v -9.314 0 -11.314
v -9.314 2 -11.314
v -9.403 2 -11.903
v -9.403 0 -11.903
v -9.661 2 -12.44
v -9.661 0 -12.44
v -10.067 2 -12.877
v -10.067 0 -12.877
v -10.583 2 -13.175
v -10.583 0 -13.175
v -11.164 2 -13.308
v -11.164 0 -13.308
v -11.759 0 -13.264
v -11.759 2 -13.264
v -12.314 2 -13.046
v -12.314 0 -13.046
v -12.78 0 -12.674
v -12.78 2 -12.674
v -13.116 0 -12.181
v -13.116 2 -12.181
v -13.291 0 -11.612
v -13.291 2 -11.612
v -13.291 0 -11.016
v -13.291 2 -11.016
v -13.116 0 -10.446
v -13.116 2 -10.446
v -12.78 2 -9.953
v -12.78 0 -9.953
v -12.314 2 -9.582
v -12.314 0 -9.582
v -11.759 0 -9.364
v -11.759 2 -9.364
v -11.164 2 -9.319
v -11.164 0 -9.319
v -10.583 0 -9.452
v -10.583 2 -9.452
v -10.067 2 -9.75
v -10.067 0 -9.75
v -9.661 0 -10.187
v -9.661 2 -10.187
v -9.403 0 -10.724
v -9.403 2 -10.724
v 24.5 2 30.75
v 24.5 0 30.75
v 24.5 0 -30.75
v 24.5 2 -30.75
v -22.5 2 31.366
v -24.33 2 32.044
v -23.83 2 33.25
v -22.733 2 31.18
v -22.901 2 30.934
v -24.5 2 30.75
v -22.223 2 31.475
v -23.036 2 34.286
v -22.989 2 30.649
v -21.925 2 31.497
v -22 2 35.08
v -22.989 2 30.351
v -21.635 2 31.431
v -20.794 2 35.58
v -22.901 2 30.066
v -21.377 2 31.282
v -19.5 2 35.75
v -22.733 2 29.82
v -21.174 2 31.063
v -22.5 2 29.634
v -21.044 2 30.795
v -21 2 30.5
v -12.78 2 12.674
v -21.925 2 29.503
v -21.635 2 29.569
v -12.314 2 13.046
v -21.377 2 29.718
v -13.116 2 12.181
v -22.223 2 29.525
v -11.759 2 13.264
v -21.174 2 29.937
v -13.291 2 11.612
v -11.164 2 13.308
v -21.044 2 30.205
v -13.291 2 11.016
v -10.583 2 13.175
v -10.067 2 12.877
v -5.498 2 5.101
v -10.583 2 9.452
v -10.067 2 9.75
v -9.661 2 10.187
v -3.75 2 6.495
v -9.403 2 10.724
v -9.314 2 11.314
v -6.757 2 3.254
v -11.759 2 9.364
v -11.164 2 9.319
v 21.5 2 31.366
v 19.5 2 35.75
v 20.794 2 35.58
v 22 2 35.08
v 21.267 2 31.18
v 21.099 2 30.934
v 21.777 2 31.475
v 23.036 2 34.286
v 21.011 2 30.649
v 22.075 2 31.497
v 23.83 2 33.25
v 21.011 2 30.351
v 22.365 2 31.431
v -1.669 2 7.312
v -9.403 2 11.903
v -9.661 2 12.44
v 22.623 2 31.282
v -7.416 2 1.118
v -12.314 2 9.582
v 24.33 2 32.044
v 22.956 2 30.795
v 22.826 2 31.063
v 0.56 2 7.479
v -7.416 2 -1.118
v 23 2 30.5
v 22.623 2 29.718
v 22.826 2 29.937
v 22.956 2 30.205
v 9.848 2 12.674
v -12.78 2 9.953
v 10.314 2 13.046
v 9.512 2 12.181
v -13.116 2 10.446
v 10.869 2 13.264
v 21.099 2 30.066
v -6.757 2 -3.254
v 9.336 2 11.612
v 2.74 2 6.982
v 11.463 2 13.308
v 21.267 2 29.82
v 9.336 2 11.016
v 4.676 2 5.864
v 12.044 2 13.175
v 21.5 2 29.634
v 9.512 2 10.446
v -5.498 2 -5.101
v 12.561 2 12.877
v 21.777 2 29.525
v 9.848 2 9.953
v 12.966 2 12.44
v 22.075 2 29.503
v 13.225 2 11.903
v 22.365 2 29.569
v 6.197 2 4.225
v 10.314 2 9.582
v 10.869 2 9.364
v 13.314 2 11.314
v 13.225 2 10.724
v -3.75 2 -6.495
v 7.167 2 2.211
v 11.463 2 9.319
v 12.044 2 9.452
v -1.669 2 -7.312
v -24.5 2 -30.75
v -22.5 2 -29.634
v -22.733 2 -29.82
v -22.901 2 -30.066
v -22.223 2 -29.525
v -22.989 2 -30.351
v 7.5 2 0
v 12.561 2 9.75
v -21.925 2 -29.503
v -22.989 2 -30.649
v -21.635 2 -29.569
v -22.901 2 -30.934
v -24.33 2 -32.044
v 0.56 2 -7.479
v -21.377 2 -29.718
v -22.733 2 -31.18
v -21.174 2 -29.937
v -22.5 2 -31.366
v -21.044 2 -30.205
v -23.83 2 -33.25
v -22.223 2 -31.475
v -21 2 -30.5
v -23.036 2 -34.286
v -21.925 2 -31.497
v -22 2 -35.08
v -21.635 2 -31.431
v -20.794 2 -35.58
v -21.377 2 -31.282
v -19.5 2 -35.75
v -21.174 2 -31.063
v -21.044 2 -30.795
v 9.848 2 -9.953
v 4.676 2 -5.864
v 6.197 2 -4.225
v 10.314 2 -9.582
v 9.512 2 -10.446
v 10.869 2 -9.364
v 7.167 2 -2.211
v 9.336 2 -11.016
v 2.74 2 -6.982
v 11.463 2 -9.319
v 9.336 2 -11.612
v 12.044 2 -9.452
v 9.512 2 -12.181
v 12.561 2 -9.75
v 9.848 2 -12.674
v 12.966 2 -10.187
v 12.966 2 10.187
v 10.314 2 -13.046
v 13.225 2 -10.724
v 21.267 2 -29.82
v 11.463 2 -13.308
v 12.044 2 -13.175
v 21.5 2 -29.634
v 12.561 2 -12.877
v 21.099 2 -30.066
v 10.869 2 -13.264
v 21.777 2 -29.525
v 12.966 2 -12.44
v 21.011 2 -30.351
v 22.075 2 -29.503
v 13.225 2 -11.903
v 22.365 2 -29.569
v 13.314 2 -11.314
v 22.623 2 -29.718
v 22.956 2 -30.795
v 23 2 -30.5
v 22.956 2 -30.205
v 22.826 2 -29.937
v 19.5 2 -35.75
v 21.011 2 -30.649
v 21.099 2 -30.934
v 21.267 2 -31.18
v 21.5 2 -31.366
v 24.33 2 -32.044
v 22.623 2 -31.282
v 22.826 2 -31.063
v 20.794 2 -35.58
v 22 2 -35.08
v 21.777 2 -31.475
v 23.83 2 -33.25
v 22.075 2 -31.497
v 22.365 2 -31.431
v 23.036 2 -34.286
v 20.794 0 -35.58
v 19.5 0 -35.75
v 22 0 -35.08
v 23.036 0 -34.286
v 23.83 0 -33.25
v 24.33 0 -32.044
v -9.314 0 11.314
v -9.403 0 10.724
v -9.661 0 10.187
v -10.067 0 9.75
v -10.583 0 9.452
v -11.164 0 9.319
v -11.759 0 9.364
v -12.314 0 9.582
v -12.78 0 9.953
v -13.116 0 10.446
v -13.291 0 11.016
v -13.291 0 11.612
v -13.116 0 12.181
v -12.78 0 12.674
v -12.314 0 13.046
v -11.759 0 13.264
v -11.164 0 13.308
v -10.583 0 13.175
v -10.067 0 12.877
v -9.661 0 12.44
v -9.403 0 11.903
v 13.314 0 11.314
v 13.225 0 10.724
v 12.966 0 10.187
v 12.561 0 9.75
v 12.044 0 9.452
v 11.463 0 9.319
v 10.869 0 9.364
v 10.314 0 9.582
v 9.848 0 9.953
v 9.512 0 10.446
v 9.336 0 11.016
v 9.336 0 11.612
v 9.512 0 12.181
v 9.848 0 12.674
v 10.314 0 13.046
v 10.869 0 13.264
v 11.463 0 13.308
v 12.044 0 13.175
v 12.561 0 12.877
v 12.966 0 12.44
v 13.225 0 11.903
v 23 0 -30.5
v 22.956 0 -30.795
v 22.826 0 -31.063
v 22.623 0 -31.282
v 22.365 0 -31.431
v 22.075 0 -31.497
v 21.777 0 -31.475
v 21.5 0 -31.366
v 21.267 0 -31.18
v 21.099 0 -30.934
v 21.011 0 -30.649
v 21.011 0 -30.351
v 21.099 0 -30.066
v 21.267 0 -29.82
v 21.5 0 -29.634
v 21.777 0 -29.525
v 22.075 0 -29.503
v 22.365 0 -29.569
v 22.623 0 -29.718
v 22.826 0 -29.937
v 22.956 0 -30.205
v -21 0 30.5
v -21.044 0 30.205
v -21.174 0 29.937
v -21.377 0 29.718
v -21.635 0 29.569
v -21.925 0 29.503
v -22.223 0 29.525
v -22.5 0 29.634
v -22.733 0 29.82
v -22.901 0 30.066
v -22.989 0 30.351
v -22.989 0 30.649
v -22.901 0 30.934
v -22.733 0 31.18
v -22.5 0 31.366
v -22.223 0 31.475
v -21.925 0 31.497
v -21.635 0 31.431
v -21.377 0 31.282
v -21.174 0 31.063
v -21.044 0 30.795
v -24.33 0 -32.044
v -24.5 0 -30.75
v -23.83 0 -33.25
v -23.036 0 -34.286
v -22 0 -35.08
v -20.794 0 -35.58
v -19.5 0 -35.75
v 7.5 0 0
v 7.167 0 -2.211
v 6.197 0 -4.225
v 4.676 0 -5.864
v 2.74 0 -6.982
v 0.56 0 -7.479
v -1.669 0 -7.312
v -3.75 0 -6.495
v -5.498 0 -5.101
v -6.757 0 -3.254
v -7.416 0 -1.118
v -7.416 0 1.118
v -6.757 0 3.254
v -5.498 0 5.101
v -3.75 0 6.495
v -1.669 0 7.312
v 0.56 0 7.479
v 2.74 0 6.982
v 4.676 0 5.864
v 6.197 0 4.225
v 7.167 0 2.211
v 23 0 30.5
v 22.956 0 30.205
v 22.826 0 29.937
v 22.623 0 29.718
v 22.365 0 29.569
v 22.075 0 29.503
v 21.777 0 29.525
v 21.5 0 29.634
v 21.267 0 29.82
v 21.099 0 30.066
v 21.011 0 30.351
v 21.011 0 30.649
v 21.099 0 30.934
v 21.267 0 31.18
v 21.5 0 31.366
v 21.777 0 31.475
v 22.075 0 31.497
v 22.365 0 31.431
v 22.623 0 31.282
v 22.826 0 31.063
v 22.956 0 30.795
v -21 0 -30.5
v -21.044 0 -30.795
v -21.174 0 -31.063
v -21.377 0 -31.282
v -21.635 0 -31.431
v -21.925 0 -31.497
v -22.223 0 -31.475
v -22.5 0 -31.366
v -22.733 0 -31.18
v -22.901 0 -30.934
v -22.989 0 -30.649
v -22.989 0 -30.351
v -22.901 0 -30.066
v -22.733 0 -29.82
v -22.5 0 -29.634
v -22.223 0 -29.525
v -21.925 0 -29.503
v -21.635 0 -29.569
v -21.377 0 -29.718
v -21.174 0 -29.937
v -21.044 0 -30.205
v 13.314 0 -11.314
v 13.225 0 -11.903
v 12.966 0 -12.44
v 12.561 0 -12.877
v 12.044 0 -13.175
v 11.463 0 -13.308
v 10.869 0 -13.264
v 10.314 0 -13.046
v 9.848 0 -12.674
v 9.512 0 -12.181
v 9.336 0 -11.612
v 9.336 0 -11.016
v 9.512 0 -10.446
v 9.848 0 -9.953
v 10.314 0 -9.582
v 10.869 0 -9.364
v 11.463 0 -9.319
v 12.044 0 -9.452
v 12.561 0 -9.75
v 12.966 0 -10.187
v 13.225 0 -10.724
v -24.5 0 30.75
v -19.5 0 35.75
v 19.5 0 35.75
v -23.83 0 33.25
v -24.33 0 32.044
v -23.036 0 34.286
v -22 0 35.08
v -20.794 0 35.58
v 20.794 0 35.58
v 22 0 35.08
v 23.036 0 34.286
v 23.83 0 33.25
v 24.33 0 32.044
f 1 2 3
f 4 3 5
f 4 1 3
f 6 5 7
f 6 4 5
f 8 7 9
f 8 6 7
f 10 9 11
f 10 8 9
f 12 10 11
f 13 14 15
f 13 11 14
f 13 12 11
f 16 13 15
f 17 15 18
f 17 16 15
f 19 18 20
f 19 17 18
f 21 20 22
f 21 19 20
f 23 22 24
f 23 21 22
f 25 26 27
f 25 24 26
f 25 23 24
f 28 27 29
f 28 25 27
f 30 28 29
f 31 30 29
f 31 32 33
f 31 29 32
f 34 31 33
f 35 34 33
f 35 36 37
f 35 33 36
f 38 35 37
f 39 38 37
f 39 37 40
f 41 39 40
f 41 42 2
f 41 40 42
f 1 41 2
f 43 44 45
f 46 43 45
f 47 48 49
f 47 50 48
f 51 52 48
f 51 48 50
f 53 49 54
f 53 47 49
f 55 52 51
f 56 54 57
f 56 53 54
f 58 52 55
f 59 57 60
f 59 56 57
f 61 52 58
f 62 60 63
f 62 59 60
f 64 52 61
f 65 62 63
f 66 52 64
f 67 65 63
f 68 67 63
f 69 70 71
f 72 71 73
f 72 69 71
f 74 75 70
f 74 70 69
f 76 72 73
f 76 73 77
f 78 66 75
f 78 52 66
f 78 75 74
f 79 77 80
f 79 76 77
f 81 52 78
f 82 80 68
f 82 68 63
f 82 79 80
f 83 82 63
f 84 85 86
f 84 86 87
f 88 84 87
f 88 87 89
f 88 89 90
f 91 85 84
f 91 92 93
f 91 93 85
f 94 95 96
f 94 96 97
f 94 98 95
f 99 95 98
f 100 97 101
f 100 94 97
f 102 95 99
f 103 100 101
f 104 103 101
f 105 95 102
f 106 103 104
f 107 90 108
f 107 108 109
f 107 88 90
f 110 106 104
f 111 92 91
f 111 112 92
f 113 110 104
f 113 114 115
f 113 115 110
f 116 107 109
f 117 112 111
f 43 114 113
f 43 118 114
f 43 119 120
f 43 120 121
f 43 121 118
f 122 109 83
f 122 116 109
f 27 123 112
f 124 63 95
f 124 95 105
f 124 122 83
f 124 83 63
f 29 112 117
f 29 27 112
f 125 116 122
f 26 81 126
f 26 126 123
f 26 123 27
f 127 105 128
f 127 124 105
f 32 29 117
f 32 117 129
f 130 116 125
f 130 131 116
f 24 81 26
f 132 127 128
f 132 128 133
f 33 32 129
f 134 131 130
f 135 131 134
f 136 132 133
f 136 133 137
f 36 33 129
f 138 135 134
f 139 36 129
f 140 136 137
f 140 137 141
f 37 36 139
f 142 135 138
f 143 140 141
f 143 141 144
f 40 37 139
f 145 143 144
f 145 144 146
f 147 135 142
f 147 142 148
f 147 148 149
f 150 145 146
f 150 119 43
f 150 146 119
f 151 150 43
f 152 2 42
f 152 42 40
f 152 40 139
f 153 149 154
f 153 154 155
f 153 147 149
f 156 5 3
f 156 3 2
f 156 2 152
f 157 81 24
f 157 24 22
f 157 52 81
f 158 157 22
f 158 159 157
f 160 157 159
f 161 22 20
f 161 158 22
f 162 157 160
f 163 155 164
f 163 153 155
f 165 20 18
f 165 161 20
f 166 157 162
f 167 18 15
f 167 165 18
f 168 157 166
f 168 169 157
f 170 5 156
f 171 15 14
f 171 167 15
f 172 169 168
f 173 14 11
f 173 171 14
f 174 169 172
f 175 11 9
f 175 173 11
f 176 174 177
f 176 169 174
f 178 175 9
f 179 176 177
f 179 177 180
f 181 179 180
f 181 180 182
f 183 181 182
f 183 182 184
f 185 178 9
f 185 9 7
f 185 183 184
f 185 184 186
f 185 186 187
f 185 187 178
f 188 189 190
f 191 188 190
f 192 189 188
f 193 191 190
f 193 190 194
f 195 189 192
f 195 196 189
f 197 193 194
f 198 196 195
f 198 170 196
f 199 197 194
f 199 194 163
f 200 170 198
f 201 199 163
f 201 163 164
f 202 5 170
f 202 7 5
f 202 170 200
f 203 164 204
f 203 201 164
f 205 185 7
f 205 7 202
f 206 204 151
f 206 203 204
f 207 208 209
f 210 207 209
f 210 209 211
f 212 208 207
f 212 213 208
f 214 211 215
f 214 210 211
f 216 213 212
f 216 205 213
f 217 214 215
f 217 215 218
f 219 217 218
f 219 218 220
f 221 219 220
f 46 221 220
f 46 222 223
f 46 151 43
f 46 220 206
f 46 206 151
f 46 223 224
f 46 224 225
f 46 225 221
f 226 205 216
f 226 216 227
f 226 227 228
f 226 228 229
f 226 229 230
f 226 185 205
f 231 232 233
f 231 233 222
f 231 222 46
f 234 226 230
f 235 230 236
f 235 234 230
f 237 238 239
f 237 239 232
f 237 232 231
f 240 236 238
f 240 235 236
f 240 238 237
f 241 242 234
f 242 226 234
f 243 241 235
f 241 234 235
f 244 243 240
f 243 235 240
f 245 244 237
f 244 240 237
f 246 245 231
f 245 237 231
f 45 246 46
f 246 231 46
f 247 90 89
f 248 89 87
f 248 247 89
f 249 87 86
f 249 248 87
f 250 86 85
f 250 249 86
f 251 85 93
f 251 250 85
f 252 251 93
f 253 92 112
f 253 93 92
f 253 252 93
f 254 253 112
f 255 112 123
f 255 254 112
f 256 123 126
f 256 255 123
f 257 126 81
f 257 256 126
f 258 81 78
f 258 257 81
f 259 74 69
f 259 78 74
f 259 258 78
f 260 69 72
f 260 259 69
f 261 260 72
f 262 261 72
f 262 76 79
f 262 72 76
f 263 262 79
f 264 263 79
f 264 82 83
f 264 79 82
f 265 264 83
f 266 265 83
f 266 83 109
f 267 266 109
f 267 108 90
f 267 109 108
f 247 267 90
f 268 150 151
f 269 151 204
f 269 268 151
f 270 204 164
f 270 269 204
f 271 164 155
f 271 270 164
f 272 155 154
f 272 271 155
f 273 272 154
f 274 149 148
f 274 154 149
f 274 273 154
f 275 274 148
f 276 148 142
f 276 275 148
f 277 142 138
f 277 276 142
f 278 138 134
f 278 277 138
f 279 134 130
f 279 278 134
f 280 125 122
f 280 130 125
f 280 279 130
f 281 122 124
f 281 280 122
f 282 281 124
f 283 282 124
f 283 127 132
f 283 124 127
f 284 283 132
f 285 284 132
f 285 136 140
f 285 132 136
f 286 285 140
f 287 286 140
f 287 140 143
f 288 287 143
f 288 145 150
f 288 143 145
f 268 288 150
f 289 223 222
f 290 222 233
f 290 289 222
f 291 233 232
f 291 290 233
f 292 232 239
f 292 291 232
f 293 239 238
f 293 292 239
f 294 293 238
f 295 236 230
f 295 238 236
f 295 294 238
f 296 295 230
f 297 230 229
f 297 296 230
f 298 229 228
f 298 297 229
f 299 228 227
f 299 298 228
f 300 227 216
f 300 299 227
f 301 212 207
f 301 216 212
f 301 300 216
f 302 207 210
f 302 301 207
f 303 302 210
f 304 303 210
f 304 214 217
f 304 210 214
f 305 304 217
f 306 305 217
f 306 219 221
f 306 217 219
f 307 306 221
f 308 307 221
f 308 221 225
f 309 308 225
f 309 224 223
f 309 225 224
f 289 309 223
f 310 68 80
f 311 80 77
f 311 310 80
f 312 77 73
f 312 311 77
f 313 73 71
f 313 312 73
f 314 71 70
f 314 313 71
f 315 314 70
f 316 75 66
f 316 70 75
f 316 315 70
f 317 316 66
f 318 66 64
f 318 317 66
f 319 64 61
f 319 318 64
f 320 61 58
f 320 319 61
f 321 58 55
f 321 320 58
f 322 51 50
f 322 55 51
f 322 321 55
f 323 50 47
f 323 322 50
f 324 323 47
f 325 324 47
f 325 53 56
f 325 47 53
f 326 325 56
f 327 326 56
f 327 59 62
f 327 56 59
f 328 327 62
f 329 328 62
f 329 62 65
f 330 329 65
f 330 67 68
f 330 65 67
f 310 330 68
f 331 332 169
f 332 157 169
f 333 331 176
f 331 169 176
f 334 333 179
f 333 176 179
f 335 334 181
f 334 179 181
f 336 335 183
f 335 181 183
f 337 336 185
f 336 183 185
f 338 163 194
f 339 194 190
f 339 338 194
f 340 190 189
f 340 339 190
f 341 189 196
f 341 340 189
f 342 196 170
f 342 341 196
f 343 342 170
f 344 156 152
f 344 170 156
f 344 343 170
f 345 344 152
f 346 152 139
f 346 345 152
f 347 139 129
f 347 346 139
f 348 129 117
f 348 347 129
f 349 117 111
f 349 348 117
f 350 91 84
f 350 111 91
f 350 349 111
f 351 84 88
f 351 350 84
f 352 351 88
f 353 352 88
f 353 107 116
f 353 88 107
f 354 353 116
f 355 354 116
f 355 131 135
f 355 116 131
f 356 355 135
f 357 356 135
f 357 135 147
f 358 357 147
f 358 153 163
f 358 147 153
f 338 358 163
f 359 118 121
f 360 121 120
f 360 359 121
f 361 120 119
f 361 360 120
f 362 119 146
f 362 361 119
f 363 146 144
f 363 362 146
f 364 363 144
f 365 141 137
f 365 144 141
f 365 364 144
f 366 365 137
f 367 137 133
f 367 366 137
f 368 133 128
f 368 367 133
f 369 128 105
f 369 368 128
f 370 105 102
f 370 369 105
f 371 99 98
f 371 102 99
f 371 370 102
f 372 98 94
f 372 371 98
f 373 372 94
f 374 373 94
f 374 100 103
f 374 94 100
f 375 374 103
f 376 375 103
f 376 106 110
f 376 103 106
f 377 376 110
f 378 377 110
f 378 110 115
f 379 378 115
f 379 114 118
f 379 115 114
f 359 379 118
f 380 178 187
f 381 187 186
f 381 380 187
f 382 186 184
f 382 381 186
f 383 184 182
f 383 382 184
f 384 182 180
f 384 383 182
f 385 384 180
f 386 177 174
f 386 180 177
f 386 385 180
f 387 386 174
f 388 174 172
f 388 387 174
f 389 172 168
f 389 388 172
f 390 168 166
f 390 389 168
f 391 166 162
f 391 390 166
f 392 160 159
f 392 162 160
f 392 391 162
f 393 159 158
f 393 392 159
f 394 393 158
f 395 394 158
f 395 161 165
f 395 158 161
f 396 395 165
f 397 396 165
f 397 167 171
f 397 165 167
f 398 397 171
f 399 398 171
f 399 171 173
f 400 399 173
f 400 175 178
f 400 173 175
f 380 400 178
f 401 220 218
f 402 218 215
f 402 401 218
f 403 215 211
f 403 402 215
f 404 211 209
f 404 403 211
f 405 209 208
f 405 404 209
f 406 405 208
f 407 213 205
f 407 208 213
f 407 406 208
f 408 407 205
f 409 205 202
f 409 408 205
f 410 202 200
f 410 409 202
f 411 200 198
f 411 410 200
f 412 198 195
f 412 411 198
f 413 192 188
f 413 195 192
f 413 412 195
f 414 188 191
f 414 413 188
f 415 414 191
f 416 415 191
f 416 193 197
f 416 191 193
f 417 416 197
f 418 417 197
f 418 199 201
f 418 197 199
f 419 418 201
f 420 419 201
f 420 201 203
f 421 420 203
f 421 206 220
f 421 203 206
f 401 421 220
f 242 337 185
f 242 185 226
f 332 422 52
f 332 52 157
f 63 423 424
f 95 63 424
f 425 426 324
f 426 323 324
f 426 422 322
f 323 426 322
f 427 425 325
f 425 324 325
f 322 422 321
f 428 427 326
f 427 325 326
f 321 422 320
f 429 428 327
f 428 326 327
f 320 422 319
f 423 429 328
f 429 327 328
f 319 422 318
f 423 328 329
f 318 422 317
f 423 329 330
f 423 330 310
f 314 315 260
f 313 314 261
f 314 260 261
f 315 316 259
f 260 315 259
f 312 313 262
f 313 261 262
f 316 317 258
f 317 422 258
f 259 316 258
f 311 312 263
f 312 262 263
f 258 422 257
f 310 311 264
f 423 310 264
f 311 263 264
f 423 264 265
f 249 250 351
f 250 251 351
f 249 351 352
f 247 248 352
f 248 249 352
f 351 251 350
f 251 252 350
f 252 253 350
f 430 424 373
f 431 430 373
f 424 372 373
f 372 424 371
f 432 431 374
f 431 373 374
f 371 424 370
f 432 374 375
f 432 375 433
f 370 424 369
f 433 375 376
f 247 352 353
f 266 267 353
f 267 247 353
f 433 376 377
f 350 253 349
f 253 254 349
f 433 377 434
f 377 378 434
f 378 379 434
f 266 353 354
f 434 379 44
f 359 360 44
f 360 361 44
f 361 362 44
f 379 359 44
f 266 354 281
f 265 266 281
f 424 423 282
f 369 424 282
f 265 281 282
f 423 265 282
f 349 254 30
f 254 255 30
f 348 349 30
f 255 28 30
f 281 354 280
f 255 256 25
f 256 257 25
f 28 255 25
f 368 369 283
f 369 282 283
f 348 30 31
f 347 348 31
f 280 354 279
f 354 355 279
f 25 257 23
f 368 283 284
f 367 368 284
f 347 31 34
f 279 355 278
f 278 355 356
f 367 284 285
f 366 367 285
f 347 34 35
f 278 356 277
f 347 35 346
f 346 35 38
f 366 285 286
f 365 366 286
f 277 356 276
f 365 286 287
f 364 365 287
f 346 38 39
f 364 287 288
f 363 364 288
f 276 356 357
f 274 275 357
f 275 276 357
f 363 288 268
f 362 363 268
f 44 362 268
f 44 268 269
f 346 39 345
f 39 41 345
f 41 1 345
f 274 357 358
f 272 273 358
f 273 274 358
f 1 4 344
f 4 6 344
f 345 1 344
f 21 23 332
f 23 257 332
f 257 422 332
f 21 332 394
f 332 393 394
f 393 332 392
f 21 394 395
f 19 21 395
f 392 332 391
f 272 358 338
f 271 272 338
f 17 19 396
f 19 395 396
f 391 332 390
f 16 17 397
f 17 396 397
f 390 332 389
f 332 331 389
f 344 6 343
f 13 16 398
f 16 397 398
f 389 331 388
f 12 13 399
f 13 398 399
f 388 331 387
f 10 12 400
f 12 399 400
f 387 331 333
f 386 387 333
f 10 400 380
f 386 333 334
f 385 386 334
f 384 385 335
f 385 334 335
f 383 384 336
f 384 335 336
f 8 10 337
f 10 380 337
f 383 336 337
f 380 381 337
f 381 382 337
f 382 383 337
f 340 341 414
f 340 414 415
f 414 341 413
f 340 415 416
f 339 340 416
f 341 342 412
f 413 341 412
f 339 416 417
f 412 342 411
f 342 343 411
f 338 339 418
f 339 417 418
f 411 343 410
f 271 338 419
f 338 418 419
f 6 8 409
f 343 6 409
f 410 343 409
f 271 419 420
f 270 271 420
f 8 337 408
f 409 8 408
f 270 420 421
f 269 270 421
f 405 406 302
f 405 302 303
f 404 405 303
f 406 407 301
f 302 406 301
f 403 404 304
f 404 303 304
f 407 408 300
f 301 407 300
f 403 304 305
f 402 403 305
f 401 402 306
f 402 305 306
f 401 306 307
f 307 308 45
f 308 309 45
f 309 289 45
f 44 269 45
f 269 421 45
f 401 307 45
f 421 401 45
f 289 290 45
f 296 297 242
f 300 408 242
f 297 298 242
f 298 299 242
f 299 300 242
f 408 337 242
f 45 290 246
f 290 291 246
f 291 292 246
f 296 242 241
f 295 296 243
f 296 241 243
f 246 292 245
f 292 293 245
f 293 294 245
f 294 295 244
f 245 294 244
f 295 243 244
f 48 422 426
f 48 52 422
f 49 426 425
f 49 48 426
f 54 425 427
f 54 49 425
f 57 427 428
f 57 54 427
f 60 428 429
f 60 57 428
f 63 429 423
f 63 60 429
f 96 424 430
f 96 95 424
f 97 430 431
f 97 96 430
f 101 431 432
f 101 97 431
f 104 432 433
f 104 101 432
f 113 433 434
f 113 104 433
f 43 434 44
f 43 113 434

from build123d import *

# Parameters (mm, degrees)
SKETCH2_W           = 49
SKETCH2_H           = 71.5
BOSS_EXTRUDE1_DEPTH = 2
SKETCH2_6_R         = 1
SKETCH2_6_R_2       = 7.5
SKETCH2_6_R_3       = 2
CUT_EXTRUDE2_DEPTH  = 10
FILLET1_R           = 5


with BuildPart() as part:
    # Sketch2 → Boss-Extrude1 (new body)
    with BuildSketch(Plane(origin=(0, 0, 0), x_dir=(1, 0, 0), z_dir=(0, 1, 0))):
        Rectangle(SKETCH2_W, SKETCH2_H)
    extrude(amount=BOSS_EXTRUDE1_DEPTH)

    # Sketch2<6> → Cut-Extrude2 (cut)
    with BuildSketch(Plane(origin=(0, 0, 0), x_dir=(1, 0, 0), z_dir=(0, 1, 0))):
        with Locations((-22, 30.5)):
            Circle(SKETCH2_6_R)
        with Locations((22, 30.5)):
            Circle(SKETCH2_6_R)
        with Locations((-22, -30.5)):
            Circle(SKETCH2_6_R)
        with Locations((22, -30.5)):
            Circle(SKETCH2_6_R)
        Circle(SKETCH2_6_R_2)
        with Locations((11.313708499, 11.313708499)):
            Circle(SKETCH2_6_R_3)
        with Locations((11.313708499, -11.313708499)):
            Circle(SKETCH2_6_R_3)
        with Locations((-11.313708499, -11.313708499)):
            Circle(SKETCH2_6_R_3)
        with Locations((-11.313708499, 11.313708499)):
            Circle(SKETCH2_6_R_3)
    extrude(amount=CUT_EXTRUDE2_DEPTH, mode=Mode.SUBTRACT)

    # Fillet1
    fillet1_edges = [part.edges().sort_by_distance(p)[0] for p in [
        (-24.5, 1, -35.75),
        (-24.5, 1, 35.75),
        (24.5, 1, 35.75),
        (24.5, 1, -35.75),
    ]]
    fillet(fillet1_edges, radius=FILLET1_R)


solid = part.part
